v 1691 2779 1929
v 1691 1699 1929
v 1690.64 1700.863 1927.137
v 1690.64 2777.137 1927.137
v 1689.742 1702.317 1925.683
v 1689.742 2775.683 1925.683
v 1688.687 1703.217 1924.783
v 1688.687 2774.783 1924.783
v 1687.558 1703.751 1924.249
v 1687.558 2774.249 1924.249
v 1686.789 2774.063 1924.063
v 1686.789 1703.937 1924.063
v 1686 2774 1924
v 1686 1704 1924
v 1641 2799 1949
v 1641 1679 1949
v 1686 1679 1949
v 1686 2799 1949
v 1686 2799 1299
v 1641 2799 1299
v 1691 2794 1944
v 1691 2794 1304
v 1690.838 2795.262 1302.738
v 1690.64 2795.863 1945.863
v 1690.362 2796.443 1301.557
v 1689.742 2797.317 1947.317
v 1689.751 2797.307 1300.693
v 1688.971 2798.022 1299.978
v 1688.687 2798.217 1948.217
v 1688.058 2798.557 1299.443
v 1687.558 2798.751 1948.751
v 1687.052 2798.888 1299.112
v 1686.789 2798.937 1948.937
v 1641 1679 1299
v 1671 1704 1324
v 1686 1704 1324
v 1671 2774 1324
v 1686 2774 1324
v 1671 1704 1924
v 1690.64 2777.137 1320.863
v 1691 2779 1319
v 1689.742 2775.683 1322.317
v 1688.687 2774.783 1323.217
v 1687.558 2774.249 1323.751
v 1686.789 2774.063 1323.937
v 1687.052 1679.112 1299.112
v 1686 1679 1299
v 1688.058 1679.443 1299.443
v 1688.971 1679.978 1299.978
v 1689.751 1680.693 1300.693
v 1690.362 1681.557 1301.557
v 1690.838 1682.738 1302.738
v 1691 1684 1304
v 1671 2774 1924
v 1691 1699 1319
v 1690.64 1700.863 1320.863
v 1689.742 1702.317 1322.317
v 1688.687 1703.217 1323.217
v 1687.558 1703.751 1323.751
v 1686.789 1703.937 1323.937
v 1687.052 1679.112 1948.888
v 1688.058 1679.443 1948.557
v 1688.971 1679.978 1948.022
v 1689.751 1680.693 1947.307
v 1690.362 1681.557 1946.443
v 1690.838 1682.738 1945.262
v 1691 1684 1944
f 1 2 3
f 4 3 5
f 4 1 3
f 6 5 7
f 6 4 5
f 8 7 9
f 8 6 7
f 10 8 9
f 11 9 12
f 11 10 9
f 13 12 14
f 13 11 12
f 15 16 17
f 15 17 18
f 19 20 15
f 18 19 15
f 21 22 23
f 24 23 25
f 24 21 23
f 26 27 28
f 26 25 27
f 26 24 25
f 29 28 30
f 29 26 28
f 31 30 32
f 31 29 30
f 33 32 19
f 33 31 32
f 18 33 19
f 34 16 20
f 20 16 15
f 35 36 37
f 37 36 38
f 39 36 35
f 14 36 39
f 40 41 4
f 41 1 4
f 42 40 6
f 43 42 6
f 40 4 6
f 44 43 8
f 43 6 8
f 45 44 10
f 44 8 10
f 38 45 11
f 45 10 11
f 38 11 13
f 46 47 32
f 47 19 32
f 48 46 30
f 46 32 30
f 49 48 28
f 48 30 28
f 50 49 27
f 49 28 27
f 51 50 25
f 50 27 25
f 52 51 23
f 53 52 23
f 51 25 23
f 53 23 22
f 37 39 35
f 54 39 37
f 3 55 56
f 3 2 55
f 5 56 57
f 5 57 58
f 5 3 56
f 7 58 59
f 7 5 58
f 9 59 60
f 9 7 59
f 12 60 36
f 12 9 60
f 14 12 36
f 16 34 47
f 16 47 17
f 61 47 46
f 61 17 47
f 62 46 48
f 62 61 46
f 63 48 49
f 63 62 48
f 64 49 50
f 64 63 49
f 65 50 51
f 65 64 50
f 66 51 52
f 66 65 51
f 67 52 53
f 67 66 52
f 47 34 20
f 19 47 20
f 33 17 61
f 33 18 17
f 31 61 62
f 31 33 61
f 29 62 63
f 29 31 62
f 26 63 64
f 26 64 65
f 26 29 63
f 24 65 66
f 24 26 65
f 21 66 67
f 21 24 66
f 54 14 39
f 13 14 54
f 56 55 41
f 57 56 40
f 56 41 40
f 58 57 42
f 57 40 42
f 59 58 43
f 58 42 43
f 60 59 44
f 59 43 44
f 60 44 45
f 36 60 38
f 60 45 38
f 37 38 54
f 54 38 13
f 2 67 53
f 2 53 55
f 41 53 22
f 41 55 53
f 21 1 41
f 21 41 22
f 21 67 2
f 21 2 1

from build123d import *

# Parameters (mm, degrees)
SKETCH625_W             = 1120
SKETCH625_H             = 650
PAD299_DEPTH            = 50
SKETCH626_W             = 1070
SKETCH626_H             = 600
POCKET007_DEPTH         = 20
FILLET210_R             = 5
BODY126_PLACEMENT_ANGLE = 90


with BuildPart() as part:
    # Sketch625 → Pad299 (new body)
    with BuildSketch(Plane.XZ):
        with Locations((560, 325)):
            Rectangle(SKETCH625_W, SKETCH625_H)
    extrude(amount=PAD299_DEPTH)

    # Sketch626 (on Face6 of Pad299) → Pocket007 (cut)
    with BuildSketch(Plane.XZ.offset(50)):
        with Locations((560, 325)):
            Rectangle(SKETCH626_W, SKETCH626_H)
    extrude(amount=-POCKET007_DEPTH, mode=Mode.SUBTRACT)

    # Fillet210
    fillet210_edges = [part.edges().sort_by_distance(p)[0] for p in [
        (560, -50, 0),
        (0, -50, 325),
        (1120, -50, 325),
        (560, -50, 650),
        (25, -50, 325),
        (560, -50, 25),
        (1095, -50, 325),
        (560, -50, 625),
    ]]
    fillet(fillet210_edges, radius=FILLET210_R)


with BuildPart() as part_1:
    # Body126 placement: moved
    add(part.part.moved(Location((1641, 1679, 1299))).rotate(Axis((1641, 1679, 1299), (0, 0, 1)), BODY126_PLACEMENT_ANGLE))


solid = part_1.part
